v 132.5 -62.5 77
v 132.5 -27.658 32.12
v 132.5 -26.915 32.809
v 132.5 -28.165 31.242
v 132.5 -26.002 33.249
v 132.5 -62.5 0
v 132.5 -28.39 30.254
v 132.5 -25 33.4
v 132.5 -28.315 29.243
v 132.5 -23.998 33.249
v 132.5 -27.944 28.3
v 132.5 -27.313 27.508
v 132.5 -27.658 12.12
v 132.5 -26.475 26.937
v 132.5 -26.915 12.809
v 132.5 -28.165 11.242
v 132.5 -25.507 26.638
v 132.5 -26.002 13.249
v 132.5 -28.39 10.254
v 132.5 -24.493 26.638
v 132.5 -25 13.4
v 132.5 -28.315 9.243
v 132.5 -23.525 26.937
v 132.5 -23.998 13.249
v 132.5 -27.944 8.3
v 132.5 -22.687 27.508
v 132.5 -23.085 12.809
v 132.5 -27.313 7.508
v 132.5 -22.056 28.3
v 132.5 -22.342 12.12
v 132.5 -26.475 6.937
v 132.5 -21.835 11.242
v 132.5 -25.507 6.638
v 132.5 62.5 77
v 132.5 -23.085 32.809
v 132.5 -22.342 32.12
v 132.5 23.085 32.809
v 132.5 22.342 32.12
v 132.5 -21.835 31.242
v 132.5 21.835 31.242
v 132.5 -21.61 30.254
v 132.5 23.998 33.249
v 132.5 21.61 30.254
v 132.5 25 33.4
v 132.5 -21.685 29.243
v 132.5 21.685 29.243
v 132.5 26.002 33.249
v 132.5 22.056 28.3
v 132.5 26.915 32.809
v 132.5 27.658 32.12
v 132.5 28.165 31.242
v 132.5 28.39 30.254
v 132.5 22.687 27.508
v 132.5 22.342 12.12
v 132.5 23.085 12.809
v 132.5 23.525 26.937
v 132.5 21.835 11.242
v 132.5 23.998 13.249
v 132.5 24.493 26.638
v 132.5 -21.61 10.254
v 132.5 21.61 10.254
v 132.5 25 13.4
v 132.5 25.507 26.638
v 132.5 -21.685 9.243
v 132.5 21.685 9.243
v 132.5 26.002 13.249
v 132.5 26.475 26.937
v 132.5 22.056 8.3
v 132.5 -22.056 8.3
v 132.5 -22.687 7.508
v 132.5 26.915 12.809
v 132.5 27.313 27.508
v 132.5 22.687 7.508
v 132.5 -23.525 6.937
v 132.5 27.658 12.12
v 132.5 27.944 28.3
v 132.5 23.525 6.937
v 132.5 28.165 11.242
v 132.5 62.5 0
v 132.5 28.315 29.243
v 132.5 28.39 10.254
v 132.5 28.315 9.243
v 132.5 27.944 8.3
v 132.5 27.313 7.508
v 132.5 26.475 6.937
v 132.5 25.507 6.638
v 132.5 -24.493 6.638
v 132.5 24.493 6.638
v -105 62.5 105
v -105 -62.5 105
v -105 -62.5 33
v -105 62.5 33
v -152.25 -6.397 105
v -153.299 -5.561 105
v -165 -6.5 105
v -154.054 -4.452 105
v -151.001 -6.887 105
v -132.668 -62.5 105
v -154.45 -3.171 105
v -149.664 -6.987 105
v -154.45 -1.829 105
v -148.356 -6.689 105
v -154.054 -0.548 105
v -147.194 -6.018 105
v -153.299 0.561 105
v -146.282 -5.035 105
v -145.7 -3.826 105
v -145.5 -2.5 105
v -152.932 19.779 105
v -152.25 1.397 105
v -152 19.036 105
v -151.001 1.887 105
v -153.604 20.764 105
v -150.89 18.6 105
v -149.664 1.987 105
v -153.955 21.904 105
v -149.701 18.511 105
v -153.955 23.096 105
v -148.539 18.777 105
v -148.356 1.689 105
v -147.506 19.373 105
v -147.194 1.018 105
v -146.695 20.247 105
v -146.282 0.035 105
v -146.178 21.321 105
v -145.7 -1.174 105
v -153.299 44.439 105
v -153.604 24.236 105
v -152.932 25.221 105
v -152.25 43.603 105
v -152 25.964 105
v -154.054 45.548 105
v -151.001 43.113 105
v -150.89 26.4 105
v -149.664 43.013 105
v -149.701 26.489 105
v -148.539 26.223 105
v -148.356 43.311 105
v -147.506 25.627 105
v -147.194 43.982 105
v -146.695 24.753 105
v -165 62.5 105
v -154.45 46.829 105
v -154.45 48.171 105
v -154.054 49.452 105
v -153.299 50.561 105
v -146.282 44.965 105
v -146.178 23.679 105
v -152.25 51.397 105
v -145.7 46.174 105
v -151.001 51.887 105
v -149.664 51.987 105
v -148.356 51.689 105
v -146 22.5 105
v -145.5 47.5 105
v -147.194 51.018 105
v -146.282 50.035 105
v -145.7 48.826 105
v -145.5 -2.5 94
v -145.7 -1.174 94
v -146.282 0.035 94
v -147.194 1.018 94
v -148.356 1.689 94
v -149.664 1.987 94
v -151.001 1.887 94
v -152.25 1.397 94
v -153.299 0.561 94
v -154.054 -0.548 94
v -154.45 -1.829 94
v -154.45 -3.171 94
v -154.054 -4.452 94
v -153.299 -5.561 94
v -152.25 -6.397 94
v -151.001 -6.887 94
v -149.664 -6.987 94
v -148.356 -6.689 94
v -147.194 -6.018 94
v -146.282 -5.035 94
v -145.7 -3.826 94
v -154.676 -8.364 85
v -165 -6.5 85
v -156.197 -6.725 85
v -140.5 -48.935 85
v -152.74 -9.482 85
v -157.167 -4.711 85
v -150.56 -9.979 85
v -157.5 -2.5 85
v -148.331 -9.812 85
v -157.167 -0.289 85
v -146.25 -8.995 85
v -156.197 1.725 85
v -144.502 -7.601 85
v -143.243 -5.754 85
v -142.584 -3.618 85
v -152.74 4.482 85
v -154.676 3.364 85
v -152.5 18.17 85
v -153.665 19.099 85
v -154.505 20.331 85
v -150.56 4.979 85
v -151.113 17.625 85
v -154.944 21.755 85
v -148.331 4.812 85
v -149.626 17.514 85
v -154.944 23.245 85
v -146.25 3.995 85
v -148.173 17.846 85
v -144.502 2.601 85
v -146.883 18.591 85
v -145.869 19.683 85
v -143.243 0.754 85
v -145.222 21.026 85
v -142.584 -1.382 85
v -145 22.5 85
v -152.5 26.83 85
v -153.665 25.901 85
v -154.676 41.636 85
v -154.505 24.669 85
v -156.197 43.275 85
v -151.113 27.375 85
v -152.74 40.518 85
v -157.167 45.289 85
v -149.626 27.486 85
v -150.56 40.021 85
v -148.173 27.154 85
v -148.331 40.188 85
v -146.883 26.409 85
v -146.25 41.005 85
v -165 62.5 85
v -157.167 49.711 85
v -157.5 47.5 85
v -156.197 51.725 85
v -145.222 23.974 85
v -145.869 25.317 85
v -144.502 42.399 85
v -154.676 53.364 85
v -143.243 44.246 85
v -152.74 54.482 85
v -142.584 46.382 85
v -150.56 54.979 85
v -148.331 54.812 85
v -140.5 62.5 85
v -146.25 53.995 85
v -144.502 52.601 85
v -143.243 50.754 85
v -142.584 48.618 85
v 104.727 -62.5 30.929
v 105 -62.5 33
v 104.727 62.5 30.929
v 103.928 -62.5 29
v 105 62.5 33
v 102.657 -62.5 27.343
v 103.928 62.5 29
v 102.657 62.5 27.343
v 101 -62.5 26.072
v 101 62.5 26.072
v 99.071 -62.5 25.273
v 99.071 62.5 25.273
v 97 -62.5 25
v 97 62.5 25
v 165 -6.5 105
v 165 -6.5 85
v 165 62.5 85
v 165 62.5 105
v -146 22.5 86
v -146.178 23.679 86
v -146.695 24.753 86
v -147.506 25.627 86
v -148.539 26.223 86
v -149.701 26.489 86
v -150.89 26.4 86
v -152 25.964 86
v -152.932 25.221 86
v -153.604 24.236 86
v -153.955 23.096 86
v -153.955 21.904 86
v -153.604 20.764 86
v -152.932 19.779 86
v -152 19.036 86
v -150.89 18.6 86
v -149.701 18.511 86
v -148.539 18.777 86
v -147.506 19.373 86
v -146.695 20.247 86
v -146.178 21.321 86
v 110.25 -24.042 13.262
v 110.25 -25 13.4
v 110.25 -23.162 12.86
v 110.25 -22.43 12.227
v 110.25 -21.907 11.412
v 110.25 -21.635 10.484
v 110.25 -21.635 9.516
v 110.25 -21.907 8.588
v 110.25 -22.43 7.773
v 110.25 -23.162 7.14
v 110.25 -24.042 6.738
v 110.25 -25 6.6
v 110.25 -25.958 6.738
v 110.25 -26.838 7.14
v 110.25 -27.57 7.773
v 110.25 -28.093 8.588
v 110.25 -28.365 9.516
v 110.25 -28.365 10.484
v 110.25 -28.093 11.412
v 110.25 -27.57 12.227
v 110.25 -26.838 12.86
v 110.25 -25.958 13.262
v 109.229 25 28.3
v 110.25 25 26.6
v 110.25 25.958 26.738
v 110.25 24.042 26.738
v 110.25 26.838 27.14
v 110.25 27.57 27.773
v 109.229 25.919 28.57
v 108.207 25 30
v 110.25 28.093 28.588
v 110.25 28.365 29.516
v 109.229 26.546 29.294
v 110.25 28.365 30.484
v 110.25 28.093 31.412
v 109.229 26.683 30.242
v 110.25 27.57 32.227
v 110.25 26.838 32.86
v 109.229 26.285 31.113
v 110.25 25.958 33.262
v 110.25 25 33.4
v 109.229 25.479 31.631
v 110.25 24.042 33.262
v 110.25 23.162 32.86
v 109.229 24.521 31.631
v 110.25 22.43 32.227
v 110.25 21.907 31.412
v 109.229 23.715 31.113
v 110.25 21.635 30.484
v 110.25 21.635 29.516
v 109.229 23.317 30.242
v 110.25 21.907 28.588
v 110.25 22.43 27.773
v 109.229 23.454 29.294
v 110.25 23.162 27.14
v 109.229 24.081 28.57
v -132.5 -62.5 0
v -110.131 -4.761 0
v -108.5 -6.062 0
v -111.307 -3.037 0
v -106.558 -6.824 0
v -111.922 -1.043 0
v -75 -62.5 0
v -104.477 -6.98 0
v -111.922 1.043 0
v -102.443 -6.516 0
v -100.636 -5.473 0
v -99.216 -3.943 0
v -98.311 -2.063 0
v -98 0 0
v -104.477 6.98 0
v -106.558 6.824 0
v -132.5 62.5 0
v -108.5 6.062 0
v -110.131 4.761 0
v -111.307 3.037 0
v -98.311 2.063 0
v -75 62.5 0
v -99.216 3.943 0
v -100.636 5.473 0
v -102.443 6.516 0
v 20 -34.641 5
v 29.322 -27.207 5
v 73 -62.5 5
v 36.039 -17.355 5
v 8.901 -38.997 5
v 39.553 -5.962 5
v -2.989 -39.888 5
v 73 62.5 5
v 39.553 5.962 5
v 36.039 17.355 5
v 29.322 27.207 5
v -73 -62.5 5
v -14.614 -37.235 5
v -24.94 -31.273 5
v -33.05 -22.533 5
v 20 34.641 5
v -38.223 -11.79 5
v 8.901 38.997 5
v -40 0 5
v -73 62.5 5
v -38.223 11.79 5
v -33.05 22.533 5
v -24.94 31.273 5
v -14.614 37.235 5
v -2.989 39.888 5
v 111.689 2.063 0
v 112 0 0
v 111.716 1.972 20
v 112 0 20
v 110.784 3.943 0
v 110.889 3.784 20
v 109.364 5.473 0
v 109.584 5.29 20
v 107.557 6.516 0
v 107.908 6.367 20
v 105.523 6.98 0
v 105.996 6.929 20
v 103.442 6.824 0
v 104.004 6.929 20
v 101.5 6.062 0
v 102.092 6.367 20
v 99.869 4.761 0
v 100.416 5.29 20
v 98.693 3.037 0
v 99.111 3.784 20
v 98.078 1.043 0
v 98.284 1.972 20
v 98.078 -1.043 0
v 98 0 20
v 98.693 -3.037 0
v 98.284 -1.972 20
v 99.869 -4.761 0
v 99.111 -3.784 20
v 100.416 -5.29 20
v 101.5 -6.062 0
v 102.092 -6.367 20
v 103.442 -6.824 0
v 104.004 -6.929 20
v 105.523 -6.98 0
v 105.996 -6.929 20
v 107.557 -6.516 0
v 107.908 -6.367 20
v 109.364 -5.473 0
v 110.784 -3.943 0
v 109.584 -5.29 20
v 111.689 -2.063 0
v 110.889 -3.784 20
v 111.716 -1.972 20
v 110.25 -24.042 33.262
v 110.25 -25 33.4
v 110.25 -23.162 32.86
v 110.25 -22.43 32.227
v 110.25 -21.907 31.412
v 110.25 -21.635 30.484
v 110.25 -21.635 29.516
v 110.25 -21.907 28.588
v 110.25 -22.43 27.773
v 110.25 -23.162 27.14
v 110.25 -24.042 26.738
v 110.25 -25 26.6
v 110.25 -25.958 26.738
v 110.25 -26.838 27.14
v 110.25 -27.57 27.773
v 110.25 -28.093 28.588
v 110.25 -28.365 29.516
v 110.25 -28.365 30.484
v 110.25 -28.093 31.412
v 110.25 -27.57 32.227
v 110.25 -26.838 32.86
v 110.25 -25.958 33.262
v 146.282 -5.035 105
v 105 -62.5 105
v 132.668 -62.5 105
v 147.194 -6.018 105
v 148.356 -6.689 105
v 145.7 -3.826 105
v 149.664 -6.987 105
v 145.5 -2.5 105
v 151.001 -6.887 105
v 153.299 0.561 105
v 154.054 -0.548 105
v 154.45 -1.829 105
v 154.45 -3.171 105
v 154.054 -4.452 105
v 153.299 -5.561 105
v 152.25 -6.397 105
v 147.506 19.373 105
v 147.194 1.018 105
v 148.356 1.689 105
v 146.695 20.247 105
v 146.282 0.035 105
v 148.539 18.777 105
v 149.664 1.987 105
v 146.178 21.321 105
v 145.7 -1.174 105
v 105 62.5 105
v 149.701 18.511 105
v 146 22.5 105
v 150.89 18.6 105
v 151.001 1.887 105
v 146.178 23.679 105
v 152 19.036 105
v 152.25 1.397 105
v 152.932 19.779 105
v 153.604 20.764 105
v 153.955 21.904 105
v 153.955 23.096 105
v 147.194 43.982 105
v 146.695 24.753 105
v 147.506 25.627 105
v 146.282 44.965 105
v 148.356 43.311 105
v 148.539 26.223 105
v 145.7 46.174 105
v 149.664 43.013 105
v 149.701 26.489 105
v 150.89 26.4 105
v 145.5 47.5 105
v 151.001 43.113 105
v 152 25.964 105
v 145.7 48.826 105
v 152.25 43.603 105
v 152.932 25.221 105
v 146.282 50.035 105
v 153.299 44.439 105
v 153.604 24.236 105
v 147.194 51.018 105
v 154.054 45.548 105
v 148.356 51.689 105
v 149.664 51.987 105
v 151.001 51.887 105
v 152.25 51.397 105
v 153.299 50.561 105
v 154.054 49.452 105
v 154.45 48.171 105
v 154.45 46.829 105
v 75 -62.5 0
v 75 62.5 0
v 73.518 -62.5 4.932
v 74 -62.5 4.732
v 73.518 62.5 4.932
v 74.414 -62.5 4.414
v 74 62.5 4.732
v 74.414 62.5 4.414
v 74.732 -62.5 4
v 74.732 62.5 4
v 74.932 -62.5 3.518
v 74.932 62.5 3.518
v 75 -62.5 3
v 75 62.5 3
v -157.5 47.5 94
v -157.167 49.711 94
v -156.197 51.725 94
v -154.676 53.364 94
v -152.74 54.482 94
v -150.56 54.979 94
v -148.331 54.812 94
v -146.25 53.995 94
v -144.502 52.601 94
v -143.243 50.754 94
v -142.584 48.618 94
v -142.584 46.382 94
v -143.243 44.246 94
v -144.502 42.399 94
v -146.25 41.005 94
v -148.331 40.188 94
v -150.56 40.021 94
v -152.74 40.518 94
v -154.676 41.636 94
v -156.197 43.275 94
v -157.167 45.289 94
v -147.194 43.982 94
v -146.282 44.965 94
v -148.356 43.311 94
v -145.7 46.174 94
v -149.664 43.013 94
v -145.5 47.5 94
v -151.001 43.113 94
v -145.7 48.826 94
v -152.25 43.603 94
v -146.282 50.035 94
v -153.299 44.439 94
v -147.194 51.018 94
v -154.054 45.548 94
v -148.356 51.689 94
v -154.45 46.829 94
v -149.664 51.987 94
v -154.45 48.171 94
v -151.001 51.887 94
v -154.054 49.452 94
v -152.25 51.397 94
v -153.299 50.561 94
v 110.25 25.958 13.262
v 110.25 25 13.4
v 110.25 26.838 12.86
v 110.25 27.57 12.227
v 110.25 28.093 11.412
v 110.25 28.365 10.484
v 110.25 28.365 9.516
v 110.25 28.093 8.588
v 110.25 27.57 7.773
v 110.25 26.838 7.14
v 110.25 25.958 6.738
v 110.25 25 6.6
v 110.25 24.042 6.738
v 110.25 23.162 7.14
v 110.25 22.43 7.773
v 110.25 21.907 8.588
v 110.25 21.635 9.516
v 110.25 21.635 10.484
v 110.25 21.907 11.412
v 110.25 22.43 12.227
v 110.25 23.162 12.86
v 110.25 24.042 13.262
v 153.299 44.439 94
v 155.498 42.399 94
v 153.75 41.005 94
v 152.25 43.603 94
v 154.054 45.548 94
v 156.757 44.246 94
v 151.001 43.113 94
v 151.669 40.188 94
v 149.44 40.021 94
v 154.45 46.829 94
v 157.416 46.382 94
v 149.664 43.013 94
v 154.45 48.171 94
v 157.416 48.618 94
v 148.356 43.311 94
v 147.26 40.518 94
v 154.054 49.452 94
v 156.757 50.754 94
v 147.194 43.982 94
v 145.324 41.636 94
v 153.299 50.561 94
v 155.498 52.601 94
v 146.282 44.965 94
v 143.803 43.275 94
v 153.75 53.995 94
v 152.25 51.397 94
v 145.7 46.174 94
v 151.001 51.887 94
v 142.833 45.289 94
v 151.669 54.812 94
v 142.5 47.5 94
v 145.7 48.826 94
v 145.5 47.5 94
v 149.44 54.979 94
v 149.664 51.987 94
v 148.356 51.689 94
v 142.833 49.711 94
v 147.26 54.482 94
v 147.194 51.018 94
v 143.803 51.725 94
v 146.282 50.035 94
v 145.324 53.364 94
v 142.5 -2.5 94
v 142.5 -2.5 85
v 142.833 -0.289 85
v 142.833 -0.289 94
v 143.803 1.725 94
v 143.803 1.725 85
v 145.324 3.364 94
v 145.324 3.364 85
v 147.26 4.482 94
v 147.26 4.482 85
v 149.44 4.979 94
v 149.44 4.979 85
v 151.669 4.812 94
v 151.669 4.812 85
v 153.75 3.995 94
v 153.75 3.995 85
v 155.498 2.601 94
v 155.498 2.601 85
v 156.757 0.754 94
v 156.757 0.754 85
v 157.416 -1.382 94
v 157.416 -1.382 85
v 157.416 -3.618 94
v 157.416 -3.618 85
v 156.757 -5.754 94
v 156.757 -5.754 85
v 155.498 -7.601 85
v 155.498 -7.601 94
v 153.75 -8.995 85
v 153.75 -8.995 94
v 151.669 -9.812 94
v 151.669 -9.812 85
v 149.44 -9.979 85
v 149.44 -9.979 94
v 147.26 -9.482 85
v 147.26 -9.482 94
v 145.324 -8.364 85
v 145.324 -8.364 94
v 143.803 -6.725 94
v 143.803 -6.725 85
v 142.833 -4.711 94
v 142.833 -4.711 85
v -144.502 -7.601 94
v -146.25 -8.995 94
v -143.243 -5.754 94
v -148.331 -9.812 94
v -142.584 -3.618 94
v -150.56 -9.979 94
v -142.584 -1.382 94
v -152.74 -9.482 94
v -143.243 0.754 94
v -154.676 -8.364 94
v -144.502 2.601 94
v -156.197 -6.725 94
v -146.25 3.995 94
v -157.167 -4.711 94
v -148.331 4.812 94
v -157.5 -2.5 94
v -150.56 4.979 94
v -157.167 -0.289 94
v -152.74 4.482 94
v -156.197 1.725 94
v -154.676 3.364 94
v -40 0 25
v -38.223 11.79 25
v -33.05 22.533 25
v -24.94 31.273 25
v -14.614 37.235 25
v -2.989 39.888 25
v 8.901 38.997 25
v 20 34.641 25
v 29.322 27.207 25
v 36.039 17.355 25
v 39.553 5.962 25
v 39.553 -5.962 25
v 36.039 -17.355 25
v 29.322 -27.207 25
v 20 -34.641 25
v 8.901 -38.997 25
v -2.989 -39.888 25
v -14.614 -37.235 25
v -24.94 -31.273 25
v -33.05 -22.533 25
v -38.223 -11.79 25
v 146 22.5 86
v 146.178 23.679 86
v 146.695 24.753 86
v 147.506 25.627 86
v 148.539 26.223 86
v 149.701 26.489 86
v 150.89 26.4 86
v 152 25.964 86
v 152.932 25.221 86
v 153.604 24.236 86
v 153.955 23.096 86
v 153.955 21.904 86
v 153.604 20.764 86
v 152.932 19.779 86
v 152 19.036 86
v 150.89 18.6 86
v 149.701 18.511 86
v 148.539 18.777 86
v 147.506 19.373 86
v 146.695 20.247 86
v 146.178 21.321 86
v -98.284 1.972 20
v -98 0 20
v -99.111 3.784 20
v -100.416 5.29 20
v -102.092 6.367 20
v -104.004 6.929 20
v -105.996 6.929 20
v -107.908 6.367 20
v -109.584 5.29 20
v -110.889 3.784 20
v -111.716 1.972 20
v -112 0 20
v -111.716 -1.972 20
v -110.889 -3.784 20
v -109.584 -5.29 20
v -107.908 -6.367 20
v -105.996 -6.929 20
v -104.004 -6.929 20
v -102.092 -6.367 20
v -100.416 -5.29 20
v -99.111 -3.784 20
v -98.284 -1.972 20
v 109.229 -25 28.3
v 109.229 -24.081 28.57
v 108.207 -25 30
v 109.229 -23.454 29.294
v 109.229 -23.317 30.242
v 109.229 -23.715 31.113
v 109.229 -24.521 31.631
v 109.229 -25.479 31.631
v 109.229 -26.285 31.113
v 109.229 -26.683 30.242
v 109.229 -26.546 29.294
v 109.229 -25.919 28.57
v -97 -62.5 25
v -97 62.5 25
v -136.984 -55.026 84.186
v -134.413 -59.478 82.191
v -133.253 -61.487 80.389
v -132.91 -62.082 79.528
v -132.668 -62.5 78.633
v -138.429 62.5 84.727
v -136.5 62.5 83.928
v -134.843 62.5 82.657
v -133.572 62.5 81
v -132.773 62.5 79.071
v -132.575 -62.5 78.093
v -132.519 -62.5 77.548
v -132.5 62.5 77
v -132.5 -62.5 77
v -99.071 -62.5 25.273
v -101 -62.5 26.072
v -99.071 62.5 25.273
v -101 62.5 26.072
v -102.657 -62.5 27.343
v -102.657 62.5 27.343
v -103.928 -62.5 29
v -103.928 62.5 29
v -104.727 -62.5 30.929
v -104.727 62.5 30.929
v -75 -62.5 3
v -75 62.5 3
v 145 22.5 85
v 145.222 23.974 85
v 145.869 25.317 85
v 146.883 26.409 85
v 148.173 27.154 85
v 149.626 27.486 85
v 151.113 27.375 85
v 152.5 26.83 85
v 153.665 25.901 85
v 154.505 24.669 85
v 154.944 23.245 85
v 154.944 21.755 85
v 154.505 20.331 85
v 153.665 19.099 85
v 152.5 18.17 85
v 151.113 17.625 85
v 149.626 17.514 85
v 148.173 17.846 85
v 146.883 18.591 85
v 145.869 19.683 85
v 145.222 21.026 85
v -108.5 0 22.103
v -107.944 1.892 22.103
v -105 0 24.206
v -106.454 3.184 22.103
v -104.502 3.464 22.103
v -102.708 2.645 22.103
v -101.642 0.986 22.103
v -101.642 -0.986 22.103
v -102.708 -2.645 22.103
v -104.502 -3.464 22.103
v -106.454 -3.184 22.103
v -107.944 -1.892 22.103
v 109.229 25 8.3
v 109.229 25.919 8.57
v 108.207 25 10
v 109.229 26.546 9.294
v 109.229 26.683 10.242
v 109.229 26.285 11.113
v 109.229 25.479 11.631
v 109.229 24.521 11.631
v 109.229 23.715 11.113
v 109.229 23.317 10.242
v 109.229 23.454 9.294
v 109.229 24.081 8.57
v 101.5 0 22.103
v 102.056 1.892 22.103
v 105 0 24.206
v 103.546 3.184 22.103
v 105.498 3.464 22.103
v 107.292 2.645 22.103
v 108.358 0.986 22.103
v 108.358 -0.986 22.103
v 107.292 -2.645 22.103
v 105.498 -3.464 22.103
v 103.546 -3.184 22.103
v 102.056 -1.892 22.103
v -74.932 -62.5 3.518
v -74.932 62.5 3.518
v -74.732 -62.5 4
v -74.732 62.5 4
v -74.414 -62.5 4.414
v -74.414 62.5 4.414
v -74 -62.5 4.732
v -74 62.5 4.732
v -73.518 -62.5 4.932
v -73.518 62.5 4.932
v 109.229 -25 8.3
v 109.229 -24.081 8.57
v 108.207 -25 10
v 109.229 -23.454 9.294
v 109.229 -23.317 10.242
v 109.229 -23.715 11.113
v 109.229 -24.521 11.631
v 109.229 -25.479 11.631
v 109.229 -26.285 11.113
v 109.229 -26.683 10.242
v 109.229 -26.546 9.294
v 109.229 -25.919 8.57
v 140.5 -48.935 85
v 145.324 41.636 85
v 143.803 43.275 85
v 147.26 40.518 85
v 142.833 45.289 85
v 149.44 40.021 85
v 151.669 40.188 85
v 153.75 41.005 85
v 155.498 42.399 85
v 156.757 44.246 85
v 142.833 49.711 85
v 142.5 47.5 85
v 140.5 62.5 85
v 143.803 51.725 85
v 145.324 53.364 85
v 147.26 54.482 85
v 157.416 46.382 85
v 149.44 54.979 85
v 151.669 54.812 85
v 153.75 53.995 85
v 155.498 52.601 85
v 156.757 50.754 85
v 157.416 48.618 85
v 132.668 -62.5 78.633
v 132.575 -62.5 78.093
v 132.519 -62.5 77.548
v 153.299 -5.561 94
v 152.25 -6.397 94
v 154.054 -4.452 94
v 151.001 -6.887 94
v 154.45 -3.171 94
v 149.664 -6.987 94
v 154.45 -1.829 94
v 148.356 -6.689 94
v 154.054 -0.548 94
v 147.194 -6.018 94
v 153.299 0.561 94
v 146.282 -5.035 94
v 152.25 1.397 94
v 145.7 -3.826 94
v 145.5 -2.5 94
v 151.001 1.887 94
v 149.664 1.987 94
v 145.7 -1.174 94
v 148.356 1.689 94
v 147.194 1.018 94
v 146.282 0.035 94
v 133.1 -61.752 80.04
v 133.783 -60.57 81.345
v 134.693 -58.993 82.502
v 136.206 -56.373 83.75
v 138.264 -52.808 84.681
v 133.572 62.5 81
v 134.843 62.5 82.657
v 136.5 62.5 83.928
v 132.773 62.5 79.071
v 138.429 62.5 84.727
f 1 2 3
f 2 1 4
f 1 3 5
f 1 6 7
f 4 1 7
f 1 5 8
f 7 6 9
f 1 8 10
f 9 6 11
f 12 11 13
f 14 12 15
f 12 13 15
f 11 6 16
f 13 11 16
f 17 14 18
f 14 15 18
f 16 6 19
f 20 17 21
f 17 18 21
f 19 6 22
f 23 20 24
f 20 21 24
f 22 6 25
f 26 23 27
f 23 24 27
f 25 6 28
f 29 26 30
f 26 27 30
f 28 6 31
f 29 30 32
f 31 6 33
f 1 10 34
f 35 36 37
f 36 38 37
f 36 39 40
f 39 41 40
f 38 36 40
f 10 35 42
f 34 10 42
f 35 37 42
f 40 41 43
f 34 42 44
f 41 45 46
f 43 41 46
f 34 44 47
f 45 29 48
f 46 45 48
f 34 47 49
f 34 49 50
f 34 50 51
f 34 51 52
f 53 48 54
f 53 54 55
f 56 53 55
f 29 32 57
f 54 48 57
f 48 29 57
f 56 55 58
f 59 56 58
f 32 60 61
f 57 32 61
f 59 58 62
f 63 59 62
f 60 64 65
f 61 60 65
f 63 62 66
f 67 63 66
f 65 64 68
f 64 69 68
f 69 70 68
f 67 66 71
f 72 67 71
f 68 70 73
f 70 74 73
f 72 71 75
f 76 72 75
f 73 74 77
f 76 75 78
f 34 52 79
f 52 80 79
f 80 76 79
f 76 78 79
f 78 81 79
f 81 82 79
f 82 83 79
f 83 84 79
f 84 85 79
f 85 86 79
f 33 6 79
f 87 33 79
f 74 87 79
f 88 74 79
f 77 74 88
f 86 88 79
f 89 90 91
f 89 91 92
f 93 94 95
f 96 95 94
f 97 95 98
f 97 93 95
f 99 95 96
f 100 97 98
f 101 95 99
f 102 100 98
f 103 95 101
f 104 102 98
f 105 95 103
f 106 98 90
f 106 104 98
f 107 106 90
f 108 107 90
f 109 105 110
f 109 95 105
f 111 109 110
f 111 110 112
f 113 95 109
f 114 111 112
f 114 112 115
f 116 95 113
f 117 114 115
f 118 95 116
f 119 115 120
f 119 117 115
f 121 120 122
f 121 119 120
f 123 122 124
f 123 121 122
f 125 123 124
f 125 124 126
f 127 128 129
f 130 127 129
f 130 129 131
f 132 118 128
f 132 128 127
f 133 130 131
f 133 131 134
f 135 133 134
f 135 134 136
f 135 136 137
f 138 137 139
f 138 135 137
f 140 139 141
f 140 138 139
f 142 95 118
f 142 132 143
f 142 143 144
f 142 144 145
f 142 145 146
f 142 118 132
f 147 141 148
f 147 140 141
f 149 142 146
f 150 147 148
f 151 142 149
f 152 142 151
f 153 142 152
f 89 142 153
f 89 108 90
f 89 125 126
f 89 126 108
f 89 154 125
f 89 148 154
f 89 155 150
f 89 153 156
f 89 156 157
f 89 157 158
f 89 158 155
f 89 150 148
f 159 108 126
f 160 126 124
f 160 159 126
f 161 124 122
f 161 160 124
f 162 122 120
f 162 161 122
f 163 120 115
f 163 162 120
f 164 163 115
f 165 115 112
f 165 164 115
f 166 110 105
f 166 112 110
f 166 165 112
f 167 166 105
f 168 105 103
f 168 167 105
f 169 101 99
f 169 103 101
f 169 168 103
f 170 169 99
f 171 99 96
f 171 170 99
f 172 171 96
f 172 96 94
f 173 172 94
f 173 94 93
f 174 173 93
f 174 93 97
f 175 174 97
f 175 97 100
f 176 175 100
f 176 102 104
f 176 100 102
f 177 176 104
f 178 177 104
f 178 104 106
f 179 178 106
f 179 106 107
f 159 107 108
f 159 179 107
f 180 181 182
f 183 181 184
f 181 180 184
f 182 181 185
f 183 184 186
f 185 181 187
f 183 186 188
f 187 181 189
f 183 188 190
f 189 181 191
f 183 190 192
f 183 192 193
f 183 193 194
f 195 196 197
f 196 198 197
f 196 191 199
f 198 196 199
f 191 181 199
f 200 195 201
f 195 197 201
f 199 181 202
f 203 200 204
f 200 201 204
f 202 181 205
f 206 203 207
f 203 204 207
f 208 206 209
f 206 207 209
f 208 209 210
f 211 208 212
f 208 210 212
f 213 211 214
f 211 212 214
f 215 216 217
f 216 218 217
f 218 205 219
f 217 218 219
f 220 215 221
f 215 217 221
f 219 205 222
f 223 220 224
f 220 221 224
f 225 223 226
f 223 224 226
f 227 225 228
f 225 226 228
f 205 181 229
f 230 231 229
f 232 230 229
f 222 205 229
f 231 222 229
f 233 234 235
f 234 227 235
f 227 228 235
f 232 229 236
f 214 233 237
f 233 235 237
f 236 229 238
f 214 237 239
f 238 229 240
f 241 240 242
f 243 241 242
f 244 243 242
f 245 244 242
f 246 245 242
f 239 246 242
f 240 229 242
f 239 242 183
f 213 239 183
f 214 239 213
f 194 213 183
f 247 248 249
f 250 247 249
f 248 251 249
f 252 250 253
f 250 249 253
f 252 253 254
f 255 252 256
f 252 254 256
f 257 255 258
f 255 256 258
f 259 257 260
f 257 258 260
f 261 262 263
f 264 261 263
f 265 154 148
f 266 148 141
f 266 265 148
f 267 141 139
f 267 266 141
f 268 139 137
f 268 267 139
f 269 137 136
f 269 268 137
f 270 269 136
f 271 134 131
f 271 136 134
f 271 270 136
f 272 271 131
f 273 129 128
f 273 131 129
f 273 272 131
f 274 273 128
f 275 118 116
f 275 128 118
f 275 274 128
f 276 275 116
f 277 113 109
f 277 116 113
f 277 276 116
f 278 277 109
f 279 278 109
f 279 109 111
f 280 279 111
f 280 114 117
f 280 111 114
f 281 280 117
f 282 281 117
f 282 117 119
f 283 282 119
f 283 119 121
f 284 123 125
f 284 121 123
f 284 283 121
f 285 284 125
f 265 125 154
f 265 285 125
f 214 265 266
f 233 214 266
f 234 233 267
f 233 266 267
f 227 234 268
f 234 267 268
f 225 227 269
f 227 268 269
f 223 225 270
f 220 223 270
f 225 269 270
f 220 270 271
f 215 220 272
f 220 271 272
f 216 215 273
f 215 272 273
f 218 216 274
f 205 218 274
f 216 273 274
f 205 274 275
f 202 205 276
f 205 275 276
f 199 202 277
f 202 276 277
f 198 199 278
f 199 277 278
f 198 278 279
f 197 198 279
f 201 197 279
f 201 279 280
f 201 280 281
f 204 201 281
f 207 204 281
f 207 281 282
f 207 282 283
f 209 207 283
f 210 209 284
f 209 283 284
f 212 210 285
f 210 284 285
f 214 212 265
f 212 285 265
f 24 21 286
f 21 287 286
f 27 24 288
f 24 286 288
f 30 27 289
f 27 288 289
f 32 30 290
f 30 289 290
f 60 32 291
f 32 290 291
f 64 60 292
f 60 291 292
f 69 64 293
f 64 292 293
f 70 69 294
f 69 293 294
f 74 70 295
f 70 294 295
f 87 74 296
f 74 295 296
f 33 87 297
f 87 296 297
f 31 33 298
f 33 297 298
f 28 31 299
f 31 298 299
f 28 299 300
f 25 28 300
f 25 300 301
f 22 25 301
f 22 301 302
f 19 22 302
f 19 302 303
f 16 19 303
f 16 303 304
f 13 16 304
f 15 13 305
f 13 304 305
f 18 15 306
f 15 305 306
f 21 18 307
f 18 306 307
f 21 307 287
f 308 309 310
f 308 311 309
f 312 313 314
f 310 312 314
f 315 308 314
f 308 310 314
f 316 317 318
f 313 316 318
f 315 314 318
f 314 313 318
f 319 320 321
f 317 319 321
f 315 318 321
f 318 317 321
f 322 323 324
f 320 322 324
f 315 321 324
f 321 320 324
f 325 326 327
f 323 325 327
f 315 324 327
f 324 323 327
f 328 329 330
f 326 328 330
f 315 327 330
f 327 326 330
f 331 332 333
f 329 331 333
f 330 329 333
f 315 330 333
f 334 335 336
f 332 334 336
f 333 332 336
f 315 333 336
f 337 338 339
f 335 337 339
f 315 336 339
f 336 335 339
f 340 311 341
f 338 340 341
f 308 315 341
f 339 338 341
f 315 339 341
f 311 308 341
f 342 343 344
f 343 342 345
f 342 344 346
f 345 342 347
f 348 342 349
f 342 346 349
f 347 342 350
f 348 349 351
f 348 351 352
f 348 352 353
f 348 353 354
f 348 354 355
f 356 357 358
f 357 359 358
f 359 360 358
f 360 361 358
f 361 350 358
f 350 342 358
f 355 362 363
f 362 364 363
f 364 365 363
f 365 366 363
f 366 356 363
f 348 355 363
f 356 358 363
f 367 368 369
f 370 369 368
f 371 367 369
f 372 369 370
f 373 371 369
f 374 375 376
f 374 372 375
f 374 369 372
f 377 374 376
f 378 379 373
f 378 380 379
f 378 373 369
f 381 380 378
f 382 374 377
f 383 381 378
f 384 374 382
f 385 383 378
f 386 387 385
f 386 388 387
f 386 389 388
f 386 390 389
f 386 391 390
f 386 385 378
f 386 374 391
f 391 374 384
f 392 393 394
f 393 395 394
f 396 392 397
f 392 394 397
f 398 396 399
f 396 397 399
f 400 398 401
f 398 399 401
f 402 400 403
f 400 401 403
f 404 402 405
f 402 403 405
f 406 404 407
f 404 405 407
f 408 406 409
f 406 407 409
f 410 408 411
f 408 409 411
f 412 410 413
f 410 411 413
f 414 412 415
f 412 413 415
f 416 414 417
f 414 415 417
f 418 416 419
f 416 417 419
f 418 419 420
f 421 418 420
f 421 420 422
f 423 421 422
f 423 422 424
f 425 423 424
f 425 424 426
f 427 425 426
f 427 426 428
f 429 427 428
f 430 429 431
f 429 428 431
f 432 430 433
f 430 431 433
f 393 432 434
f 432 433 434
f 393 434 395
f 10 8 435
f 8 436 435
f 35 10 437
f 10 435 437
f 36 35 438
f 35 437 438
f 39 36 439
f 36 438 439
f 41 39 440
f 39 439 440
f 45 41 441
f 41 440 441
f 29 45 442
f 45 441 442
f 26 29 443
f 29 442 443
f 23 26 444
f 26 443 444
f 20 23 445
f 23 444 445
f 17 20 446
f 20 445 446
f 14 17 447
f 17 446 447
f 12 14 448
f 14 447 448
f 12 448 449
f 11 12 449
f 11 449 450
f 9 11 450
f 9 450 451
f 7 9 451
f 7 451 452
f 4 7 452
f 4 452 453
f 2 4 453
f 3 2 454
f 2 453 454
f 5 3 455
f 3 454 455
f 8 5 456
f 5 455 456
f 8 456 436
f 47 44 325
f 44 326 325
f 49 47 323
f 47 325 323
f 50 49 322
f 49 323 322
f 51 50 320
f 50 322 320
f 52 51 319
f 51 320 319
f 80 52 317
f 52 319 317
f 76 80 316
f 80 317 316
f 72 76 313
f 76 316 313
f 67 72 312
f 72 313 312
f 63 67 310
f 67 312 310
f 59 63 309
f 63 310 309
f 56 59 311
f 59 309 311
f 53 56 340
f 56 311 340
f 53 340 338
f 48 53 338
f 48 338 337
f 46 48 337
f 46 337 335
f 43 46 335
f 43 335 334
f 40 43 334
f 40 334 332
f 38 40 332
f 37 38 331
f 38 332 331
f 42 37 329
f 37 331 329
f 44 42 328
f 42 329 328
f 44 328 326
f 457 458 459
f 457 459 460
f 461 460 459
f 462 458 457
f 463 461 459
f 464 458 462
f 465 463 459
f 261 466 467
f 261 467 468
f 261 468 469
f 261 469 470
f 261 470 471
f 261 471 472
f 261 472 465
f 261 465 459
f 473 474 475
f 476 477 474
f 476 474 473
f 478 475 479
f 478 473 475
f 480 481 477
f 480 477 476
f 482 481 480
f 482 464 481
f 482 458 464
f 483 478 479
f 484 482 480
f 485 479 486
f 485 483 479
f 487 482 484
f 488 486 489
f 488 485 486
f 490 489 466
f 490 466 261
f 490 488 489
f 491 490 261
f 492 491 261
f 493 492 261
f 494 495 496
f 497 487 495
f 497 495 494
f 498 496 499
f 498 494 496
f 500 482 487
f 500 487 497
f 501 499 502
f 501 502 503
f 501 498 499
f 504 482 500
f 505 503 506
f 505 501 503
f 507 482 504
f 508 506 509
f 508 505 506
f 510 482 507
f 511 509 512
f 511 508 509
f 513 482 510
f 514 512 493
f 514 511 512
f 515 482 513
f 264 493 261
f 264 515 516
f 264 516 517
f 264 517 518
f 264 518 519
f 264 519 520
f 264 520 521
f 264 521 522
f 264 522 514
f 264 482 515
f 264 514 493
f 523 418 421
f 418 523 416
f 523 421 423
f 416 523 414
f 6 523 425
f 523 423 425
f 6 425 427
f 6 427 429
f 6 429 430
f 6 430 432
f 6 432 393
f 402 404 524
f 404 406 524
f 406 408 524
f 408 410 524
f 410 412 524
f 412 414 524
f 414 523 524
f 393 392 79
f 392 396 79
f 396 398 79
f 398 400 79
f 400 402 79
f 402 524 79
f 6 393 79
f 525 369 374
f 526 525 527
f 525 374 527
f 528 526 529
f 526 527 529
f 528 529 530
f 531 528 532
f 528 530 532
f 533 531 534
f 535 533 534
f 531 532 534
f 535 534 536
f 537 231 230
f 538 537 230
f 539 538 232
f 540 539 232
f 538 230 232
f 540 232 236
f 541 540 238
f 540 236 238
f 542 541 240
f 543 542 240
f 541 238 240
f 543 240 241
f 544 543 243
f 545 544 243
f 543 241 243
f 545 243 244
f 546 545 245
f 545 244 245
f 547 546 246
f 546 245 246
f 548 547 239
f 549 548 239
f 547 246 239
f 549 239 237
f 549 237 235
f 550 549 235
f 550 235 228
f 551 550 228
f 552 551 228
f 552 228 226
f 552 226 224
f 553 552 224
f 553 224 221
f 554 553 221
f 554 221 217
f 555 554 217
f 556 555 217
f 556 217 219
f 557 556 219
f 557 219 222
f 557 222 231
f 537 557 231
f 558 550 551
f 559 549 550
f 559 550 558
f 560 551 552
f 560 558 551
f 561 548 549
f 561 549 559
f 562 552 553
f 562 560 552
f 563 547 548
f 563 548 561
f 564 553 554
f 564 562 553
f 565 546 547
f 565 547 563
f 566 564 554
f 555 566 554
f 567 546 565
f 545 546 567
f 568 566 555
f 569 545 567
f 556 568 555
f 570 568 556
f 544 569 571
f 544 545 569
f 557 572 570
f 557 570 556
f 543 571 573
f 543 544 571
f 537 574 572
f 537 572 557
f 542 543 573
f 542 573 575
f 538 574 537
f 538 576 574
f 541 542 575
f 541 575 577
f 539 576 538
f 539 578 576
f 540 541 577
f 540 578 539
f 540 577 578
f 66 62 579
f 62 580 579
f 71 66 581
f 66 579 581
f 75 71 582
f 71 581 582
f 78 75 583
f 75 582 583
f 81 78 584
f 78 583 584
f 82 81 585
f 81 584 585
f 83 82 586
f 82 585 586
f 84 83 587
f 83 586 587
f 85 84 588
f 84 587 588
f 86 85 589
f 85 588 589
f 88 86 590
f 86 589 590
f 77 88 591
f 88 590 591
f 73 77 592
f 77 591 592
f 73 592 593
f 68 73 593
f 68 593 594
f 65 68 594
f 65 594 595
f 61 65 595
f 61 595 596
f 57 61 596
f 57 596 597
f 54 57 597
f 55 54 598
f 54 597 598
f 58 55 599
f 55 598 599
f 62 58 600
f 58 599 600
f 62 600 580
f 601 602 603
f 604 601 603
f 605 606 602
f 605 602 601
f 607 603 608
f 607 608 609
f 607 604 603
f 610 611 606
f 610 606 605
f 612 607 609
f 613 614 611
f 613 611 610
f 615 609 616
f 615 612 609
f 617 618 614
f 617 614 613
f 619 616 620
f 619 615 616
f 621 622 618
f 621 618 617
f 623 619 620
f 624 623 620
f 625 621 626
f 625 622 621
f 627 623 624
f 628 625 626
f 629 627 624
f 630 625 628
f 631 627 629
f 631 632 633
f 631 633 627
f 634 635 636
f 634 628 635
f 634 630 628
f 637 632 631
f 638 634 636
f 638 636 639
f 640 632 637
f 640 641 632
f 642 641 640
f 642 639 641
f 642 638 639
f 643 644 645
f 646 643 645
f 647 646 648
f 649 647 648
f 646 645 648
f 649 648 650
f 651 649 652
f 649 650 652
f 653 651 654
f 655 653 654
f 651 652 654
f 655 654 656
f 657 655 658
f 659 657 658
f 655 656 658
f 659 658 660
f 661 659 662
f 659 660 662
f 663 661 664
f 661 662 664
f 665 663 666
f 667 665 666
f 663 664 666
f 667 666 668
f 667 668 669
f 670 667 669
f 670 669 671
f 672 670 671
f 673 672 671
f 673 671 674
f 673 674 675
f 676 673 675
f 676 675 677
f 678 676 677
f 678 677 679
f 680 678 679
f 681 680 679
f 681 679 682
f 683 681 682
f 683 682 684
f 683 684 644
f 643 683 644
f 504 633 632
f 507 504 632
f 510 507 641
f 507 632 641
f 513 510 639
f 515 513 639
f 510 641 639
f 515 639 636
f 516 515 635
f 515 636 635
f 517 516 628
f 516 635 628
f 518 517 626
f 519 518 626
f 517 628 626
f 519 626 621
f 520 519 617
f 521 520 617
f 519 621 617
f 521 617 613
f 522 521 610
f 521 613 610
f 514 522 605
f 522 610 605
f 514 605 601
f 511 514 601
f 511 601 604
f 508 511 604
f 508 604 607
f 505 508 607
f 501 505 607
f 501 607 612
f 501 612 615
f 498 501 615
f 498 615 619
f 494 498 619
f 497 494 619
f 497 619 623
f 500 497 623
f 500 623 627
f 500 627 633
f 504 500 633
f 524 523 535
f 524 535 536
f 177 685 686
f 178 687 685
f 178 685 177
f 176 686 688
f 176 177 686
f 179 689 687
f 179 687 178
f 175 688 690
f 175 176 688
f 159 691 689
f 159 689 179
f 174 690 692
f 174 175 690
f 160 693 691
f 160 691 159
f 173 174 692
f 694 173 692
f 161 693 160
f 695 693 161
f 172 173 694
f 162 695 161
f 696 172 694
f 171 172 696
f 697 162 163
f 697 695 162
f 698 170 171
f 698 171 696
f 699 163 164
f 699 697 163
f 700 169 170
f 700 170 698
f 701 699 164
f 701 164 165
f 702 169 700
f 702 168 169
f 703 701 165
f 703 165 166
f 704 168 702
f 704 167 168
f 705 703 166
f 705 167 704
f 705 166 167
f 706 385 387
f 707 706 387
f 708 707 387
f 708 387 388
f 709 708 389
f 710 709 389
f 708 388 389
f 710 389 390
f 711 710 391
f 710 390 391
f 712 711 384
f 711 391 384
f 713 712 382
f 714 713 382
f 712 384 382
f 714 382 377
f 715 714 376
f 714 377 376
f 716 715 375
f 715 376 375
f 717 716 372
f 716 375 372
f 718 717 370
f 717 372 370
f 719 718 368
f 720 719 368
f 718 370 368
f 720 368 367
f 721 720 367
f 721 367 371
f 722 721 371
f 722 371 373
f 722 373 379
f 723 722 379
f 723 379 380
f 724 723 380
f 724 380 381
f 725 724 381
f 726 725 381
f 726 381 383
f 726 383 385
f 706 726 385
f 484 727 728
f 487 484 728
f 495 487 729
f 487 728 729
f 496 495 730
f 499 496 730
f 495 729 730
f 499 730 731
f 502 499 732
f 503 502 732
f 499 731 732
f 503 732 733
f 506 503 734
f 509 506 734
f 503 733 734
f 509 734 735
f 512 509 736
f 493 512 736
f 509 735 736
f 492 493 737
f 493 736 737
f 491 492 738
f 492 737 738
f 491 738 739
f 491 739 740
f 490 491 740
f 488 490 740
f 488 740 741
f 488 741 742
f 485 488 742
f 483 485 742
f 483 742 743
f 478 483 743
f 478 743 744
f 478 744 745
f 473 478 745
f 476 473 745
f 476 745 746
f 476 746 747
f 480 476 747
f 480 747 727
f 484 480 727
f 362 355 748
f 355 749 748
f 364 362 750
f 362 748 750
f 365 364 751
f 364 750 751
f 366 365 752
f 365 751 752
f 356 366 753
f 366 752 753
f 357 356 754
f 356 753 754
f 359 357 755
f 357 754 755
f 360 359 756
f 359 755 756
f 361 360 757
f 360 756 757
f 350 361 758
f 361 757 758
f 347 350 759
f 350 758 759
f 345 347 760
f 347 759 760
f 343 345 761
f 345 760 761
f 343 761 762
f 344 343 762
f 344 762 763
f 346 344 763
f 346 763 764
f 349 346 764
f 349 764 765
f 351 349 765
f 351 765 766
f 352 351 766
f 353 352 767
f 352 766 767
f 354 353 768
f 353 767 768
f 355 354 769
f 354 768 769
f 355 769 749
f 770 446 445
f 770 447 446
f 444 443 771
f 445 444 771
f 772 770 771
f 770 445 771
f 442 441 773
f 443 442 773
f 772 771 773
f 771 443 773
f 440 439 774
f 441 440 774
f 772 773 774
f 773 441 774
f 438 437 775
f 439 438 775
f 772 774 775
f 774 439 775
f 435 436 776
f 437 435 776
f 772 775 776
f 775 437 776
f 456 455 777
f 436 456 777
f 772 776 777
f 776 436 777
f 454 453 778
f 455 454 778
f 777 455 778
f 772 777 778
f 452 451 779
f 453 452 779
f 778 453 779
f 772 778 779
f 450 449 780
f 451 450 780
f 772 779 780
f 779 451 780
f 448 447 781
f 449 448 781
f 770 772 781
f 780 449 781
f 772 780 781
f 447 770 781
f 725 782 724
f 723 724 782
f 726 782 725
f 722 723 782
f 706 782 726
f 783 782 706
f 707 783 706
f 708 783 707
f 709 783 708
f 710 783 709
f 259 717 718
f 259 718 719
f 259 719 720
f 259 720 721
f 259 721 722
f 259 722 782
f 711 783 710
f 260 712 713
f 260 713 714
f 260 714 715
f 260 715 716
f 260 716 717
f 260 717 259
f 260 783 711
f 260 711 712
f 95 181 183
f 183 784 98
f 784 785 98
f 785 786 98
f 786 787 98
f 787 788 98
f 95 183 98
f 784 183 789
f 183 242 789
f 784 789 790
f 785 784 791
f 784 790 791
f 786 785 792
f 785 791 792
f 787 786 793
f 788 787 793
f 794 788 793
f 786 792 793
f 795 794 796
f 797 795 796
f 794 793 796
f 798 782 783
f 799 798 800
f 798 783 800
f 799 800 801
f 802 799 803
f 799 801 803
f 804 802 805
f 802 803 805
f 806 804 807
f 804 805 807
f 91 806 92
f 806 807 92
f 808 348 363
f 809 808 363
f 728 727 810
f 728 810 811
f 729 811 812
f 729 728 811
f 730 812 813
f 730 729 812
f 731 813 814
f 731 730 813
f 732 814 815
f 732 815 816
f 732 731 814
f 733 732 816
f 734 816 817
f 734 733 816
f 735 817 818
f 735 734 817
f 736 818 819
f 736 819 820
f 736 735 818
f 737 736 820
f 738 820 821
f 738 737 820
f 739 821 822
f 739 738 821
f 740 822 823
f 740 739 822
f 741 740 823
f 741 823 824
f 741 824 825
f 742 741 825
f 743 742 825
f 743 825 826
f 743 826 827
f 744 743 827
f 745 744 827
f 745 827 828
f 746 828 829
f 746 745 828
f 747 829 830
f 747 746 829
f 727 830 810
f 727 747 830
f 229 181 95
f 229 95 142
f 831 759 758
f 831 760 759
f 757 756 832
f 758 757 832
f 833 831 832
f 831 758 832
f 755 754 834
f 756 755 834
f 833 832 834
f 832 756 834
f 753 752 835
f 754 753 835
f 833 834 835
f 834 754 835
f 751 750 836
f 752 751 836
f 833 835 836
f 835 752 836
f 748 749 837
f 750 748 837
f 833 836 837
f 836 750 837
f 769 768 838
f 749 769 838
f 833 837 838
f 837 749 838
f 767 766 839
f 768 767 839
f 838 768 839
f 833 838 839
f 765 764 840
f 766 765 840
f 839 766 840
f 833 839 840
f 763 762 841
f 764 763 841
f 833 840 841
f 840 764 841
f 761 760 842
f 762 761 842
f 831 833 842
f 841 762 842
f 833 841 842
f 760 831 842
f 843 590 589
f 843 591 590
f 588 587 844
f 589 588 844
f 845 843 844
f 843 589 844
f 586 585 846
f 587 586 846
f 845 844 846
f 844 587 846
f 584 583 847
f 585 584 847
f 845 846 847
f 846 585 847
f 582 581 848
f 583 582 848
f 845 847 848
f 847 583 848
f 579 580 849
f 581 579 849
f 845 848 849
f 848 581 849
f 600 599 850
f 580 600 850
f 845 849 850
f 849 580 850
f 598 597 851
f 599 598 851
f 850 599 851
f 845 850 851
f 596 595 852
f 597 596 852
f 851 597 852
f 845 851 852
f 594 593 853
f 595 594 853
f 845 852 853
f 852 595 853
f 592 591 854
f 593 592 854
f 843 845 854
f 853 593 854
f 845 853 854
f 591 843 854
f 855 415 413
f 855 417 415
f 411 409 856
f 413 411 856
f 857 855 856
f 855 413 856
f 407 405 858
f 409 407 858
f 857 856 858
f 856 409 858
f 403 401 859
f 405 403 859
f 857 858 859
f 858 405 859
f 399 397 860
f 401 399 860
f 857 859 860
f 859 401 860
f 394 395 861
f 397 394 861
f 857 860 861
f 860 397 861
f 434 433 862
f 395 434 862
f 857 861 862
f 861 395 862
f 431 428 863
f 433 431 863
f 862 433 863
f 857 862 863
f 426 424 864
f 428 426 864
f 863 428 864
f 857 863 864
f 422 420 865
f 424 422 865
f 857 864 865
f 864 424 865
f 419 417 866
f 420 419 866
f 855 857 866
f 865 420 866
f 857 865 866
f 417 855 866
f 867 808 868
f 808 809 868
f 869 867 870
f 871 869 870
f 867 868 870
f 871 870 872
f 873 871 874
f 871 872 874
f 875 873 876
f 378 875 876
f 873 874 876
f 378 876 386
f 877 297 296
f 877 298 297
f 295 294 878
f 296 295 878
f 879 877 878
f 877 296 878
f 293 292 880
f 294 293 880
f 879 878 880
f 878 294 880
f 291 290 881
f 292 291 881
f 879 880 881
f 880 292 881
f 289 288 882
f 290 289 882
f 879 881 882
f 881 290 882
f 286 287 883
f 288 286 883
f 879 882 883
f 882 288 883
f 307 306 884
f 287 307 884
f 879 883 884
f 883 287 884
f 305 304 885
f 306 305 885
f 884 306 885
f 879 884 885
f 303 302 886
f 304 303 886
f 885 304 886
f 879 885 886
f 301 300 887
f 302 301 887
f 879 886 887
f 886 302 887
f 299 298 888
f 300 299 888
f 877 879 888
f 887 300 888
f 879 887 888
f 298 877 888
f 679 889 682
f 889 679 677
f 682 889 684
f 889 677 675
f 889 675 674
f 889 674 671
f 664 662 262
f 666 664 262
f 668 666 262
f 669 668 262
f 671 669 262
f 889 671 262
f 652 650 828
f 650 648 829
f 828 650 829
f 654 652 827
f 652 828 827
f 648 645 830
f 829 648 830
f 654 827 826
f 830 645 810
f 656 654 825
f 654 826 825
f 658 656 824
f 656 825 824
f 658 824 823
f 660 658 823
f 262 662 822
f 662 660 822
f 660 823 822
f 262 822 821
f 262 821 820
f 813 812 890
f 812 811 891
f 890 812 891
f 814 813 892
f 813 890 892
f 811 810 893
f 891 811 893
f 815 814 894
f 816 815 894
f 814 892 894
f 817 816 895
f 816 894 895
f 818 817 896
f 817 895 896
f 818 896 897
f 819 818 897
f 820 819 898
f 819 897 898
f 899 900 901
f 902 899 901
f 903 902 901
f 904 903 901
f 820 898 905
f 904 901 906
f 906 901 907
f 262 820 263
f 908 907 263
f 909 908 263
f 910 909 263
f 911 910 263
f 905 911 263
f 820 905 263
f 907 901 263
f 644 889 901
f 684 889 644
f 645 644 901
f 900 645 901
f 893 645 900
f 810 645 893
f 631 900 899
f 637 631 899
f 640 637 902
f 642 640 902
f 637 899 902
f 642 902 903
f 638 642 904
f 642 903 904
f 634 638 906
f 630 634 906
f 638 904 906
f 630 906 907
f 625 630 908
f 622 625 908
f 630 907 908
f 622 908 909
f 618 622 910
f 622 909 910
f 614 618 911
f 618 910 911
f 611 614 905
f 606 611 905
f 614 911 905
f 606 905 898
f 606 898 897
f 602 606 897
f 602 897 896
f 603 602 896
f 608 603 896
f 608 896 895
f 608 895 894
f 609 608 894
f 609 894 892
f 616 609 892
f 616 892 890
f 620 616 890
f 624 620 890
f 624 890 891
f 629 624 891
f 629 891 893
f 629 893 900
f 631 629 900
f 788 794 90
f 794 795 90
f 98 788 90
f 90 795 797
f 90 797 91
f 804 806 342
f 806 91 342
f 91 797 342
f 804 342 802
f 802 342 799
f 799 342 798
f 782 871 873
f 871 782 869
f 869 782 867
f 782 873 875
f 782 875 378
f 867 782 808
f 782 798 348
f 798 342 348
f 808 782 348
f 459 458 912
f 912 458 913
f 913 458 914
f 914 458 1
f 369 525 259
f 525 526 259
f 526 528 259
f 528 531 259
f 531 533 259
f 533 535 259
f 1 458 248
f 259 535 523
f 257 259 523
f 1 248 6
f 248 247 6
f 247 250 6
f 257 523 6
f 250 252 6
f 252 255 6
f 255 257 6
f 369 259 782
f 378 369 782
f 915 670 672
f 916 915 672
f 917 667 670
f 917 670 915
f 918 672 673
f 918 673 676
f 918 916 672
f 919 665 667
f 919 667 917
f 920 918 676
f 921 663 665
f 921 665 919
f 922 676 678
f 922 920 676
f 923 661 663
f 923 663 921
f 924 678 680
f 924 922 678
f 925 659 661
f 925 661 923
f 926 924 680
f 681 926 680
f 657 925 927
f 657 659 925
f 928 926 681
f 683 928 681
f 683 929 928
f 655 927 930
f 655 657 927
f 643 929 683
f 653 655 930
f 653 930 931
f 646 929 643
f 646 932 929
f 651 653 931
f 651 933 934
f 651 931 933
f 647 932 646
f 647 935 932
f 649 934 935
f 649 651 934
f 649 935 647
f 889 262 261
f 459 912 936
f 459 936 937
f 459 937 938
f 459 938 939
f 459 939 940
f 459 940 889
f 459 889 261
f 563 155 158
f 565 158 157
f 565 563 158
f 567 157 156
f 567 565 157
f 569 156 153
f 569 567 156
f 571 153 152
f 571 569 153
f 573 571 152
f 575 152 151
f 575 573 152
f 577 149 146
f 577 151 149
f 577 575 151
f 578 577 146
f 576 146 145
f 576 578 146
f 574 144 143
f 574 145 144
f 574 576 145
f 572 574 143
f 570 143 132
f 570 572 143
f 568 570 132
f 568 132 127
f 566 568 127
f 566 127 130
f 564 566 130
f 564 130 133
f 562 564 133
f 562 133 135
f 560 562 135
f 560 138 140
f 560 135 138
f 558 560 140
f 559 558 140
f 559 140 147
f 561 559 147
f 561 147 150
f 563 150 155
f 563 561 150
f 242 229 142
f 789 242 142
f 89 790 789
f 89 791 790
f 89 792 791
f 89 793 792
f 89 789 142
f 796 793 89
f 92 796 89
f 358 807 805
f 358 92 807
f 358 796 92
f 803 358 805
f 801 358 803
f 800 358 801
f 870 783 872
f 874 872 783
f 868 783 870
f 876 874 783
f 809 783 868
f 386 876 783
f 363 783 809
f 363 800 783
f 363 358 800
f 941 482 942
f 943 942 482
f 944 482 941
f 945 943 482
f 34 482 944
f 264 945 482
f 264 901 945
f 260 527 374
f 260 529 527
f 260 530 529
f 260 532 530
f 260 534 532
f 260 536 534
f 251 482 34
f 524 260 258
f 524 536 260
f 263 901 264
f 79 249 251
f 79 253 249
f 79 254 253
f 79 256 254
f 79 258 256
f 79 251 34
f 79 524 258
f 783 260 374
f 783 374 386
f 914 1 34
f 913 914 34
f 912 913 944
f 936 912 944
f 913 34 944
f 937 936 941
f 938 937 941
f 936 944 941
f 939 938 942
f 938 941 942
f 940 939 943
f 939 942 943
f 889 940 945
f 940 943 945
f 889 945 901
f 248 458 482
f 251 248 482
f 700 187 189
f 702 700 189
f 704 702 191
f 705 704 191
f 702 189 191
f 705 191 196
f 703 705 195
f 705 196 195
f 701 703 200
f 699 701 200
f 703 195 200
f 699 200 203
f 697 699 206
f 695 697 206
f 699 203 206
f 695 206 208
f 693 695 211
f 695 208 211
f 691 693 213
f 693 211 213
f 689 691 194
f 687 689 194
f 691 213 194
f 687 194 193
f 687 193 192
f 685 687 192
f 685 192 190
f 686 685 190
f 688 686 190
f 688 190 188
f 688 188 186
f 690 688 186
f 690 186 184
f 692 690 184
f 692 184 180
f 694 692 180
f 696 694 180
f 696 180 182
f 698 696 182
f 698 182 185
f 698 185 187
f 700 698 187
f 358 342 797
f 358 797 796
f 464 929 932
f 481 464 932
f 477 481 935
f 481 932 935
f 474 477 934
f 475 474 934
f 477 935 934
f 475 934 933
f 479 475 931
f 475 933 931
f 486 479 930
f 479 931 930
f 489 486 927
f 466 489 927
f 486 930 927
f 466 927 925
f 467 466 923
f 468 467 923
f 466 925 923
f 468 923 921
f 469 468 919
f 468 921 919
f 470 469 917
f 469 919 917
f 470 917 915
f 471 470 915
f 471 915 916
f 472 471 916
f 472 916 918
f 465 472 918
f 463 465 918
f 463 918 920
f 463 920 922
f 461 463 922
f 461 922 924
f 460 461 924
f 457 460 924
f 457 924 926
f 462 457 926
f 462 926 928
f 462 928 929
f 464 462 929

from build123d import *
from OCP.BRepFilletAPI import BRepFilletAPI_MakeChamfer

# Parameters (mm, degrees)
SKETCH_1_W                = 265
SKETCH_1_H                = 125
EXTRUDE_1_DEPTH           = 85
SKETCH_2_W                = 330
SKETCH_2_H                = 125
EXTRUDE_2_DEPTH           = 20
SKETCH_3_W                = 150
SKETCH_3_H                = 125
CUT_EXTRUDE_1_DEPTH       = 5
SKETCH_4_R                = 40
CUT_EXTRUDE_2_DEPTH       = 206.319872394
SKETCH_5_W                = 210
SKETCH_5_H                = 125
CUT_EXTRUDE_3_DEPTH       = 80
CHAMFER_2_SIZE            = 56
CHAMFER_2_SIZE2           = 32.331615075
SKETCH_10_R               = 4.5
SKETCH_10_R_2             = 4
CUT_EXTRUDE_4_DEPTH       = 196.847517217
HOLE_WIZARD_M16_1_D       = 14
HOLE_WIZARD_M16_1_DEPTH   = 20
HOLE_WIZARD_M16_1_TIP     = 4.206024333
CHAMFER_3_SIZE            = 1
HOLE_WIZARD_1_D           = 9
HOLE_WIZARD_1_CBORE_D     = 15
HOLE_WIZARD_1_CBORE_DEPTH = 9
HOLE_WIZARD_M8_1_D        = 6.8
HOLE_WIZARD_M8_1_DEPTH    = 22.25
HOLE_WIZARD_M8_1_TIP      = 2.042926105
FILLET_1_R                = 8
FILLET_2_R                = 2


with BuildPart() as part:
    # 草图1 → 凸台-拉伸1 (new body)
    with BuildSketch(Plane.XY):
        Rectangle(SKETCH_1_W, SKETCH_1_H)
    extrude(amount=EXTRUDE_1_DEPTH)

    # 草图2 → 凸台-拉伸2 (add)
    with BuildSketch(Plane.XY.offset(85)):
        Rectangle(SKETCH_2_W, SKETCH_2_H)
    extrude(amount=EXTRUDE_2_DEPTH)

    # 草图3 → 切除-拉伸1 (cut)
    with BuildSketch(Plane(origin=(0, 0, 0), x_dir=(-1, 0, 0), z_dir=(0, 0, -1))):
        Rectangle(SKETCH_3_W, SKETCH_3_H)
    extrude(amount=-CUT_EXTRUDE_1_DEPTH, mode=Mode.SUBTRACT)

    # 草图4 → 切除-拉伸2 (cut, through all)
    with BuildSketch(Plane(origin=(0, 0, 0), x_dir=(-1, 0, 0), z_dir=(0, 0, -1))):
        Circle(SKETCH_4_R)
    extrude(amount=-CUT_EXTRUDE_2_DEPTH, mode=Mode.SUBTRACT)

    # 草图5 → 切除-拉伸3 (cut)
    with BuildSketch(Plane.XY.offset(105)):
        Rectangle(SKETCH_5_W, SKETCH_5_H)
    extrude(amount=-CUT_EXTRUDE_3_DEPTH, mode=Mode.SUBTRACT)

    # 倒角2: one chamfer whose edges measure the first distance from different faces: ONE call of the kernel's chamfer builder (chamfer() names one face for all edges)
    chamfer_2_edges_1 = [part.edges().sort_by_distance(p)[0] for p in [
        (165, -62.5, 95),
    ]]
    chamfer_2_side_1 = [part.faces().sort_by_distance(p)[0] for p in [
        (165, 0, 95),
    ]]
    chamfer_2_edges_2 = [part.edges().sort_by_distance(p)[0] for p in [
        (-165, -62.5, 95),
    ]]
    chamfer_2_side_2 = [part.faces().sort_by_distance(p)[0] for p in [
        (-165, 0, 95),
    ]]
    chamfer_2 = BRepFilletAPI_MakeChamfer(part.part.solid().wrapped)
    for e in chamfer_2_edges_1:
        chamfer_2.Add(CHAMFER_2_SIZE, CHAMFER_2_SIZE2, e.wrapped, chamfer_2_side_1[0].wrapped)  # the first distance lies on this face
    for e in chamfer_2_edges_2:
        chamfer_2.Add(CHAMFER_2_SIZE, CHAMFER_2_SIZE2, e.wrapped, chamfer_2_side_2[0].wrapped)  # the first distance lies on this face
    add(Compound.cast(chamfer_2.Shape()), mode=Mode.REPLACE)

    # 草图10 → 切除-拉伸4 (cut, through all)
    with BuildSketch(Plane(origin=(0, 0, 85), x_dir=(-1, 0, 0), z_dir=(0, 0, -1))):
        with Locations((-150, 47.5)):
            Circle(SKETCH_10_R)
        with Locations((-150, -2.5)):
            Circle(SKETCH_10_R)
        with Locations((-150, 22.5)):
            Circle(SKETCH_10_R_2)
    cut_extrude_4 = extrude(amount=-CUT_EXTRUDE_4_DEPTH, mode=Mode.SUBTRACT)

    # M16 螺纹孔1
    with Locations(Plane(origin=(0, 0, 0), x_dir=(-1, 0, 0), z_dir=(0, 0, -1))):
        with Locations((105, 0), (-105, 0)):
            Hole(HOLE_WIZARD_M16_1_D / 2, depth=HOLE_WIZARD_M16_1_DEPTH)
            with Locations((0, 0, -(HOLE_WIZARD_M16_1_DEPTH + HOLE_WIZARD_M16_1_TIP / 2))):  # 118° drill point
                Cone(0, HOLE_WIZARD_M16_1_D / 2, HOLE_WIZARD_M16_1_TIP, mode=Mode.SUBTRACT)

    # 镜向1: 切除-拉伸4 across plane
    add(cut_extrude_4.mirror(Plane.ZY), mode=Mode.SUBTRACT)

    # 倒角3
    chamfer_3_edges = [part.edges().sort_by_distance(p)[0] for p in [
        (-154, 22.5, 85),
        (154, 22.5, 85),
    ]]
    chamfer(chamfer_3_edges, length=CHAMFER_3_SIZE)

    # 打孔尺寸根据内六角圆柱头螺钉的类型1 (through all)
    with Locations(Plane(origin=(0, 0, 85), x_dir=(-1, 0, 0), z_dir=(0, 0, -1))):
        with Locations((150, -2.5), (150, 47.5), (-150, -2.5), (-150, 47.5)):
            CounterBoreHole(HOLE_WIZARD_1_D / 2, HOLE_WIZARD_1_CBORE_D / 2, HOLE_WIZARD_1_CBORE_DEPTH)

    # M8 螺纹孔1
    with Locations(Plane(origin=(132.5, 0, 0), x_dir=(0, 0, -1), z_dir=(1, 0, 0))):
        with Locations((-10, 25), (-30, 25), (-30, -25), (-10, -25)):
            Hole(HOLE_WIZARD_M8_1_D / 2, depth=HOLE_WIZARD_M8_1_DEPTH)
            with Locations((0, 0, -(HOLE_WIZARD_M8_1_DEPTH + HOLE_WIZARD_M8_1_TIP / 2))):  # 118° drill point
                Cone(0, HOLE_WIZARD_M8_1_D / 2, HOLE_WIZARD_M8_1_TIP, mode=Mode.SUBTRACT)

    # 圆角1
    fillet_1_edges = [part.edges().sort_by_distance(p)[0] for p in [
        (132.5, 0, 85),
        (-132.5, 0, 85),
        (105, 0, 25),
        (-105, 0, 25),
    ]]
    fillet(fillet_1_edges, radius=FILLET_1_R)

    # 圆角2
    fillet_2_edges = [part.edges().sort_by_distance(p)[0] for p in [
        (75, 0, 5),
        (-75, 0, 5),
    ]]
    fillet(fillet_2_edges, radius=FILLET_2_R)


solid = part.part
